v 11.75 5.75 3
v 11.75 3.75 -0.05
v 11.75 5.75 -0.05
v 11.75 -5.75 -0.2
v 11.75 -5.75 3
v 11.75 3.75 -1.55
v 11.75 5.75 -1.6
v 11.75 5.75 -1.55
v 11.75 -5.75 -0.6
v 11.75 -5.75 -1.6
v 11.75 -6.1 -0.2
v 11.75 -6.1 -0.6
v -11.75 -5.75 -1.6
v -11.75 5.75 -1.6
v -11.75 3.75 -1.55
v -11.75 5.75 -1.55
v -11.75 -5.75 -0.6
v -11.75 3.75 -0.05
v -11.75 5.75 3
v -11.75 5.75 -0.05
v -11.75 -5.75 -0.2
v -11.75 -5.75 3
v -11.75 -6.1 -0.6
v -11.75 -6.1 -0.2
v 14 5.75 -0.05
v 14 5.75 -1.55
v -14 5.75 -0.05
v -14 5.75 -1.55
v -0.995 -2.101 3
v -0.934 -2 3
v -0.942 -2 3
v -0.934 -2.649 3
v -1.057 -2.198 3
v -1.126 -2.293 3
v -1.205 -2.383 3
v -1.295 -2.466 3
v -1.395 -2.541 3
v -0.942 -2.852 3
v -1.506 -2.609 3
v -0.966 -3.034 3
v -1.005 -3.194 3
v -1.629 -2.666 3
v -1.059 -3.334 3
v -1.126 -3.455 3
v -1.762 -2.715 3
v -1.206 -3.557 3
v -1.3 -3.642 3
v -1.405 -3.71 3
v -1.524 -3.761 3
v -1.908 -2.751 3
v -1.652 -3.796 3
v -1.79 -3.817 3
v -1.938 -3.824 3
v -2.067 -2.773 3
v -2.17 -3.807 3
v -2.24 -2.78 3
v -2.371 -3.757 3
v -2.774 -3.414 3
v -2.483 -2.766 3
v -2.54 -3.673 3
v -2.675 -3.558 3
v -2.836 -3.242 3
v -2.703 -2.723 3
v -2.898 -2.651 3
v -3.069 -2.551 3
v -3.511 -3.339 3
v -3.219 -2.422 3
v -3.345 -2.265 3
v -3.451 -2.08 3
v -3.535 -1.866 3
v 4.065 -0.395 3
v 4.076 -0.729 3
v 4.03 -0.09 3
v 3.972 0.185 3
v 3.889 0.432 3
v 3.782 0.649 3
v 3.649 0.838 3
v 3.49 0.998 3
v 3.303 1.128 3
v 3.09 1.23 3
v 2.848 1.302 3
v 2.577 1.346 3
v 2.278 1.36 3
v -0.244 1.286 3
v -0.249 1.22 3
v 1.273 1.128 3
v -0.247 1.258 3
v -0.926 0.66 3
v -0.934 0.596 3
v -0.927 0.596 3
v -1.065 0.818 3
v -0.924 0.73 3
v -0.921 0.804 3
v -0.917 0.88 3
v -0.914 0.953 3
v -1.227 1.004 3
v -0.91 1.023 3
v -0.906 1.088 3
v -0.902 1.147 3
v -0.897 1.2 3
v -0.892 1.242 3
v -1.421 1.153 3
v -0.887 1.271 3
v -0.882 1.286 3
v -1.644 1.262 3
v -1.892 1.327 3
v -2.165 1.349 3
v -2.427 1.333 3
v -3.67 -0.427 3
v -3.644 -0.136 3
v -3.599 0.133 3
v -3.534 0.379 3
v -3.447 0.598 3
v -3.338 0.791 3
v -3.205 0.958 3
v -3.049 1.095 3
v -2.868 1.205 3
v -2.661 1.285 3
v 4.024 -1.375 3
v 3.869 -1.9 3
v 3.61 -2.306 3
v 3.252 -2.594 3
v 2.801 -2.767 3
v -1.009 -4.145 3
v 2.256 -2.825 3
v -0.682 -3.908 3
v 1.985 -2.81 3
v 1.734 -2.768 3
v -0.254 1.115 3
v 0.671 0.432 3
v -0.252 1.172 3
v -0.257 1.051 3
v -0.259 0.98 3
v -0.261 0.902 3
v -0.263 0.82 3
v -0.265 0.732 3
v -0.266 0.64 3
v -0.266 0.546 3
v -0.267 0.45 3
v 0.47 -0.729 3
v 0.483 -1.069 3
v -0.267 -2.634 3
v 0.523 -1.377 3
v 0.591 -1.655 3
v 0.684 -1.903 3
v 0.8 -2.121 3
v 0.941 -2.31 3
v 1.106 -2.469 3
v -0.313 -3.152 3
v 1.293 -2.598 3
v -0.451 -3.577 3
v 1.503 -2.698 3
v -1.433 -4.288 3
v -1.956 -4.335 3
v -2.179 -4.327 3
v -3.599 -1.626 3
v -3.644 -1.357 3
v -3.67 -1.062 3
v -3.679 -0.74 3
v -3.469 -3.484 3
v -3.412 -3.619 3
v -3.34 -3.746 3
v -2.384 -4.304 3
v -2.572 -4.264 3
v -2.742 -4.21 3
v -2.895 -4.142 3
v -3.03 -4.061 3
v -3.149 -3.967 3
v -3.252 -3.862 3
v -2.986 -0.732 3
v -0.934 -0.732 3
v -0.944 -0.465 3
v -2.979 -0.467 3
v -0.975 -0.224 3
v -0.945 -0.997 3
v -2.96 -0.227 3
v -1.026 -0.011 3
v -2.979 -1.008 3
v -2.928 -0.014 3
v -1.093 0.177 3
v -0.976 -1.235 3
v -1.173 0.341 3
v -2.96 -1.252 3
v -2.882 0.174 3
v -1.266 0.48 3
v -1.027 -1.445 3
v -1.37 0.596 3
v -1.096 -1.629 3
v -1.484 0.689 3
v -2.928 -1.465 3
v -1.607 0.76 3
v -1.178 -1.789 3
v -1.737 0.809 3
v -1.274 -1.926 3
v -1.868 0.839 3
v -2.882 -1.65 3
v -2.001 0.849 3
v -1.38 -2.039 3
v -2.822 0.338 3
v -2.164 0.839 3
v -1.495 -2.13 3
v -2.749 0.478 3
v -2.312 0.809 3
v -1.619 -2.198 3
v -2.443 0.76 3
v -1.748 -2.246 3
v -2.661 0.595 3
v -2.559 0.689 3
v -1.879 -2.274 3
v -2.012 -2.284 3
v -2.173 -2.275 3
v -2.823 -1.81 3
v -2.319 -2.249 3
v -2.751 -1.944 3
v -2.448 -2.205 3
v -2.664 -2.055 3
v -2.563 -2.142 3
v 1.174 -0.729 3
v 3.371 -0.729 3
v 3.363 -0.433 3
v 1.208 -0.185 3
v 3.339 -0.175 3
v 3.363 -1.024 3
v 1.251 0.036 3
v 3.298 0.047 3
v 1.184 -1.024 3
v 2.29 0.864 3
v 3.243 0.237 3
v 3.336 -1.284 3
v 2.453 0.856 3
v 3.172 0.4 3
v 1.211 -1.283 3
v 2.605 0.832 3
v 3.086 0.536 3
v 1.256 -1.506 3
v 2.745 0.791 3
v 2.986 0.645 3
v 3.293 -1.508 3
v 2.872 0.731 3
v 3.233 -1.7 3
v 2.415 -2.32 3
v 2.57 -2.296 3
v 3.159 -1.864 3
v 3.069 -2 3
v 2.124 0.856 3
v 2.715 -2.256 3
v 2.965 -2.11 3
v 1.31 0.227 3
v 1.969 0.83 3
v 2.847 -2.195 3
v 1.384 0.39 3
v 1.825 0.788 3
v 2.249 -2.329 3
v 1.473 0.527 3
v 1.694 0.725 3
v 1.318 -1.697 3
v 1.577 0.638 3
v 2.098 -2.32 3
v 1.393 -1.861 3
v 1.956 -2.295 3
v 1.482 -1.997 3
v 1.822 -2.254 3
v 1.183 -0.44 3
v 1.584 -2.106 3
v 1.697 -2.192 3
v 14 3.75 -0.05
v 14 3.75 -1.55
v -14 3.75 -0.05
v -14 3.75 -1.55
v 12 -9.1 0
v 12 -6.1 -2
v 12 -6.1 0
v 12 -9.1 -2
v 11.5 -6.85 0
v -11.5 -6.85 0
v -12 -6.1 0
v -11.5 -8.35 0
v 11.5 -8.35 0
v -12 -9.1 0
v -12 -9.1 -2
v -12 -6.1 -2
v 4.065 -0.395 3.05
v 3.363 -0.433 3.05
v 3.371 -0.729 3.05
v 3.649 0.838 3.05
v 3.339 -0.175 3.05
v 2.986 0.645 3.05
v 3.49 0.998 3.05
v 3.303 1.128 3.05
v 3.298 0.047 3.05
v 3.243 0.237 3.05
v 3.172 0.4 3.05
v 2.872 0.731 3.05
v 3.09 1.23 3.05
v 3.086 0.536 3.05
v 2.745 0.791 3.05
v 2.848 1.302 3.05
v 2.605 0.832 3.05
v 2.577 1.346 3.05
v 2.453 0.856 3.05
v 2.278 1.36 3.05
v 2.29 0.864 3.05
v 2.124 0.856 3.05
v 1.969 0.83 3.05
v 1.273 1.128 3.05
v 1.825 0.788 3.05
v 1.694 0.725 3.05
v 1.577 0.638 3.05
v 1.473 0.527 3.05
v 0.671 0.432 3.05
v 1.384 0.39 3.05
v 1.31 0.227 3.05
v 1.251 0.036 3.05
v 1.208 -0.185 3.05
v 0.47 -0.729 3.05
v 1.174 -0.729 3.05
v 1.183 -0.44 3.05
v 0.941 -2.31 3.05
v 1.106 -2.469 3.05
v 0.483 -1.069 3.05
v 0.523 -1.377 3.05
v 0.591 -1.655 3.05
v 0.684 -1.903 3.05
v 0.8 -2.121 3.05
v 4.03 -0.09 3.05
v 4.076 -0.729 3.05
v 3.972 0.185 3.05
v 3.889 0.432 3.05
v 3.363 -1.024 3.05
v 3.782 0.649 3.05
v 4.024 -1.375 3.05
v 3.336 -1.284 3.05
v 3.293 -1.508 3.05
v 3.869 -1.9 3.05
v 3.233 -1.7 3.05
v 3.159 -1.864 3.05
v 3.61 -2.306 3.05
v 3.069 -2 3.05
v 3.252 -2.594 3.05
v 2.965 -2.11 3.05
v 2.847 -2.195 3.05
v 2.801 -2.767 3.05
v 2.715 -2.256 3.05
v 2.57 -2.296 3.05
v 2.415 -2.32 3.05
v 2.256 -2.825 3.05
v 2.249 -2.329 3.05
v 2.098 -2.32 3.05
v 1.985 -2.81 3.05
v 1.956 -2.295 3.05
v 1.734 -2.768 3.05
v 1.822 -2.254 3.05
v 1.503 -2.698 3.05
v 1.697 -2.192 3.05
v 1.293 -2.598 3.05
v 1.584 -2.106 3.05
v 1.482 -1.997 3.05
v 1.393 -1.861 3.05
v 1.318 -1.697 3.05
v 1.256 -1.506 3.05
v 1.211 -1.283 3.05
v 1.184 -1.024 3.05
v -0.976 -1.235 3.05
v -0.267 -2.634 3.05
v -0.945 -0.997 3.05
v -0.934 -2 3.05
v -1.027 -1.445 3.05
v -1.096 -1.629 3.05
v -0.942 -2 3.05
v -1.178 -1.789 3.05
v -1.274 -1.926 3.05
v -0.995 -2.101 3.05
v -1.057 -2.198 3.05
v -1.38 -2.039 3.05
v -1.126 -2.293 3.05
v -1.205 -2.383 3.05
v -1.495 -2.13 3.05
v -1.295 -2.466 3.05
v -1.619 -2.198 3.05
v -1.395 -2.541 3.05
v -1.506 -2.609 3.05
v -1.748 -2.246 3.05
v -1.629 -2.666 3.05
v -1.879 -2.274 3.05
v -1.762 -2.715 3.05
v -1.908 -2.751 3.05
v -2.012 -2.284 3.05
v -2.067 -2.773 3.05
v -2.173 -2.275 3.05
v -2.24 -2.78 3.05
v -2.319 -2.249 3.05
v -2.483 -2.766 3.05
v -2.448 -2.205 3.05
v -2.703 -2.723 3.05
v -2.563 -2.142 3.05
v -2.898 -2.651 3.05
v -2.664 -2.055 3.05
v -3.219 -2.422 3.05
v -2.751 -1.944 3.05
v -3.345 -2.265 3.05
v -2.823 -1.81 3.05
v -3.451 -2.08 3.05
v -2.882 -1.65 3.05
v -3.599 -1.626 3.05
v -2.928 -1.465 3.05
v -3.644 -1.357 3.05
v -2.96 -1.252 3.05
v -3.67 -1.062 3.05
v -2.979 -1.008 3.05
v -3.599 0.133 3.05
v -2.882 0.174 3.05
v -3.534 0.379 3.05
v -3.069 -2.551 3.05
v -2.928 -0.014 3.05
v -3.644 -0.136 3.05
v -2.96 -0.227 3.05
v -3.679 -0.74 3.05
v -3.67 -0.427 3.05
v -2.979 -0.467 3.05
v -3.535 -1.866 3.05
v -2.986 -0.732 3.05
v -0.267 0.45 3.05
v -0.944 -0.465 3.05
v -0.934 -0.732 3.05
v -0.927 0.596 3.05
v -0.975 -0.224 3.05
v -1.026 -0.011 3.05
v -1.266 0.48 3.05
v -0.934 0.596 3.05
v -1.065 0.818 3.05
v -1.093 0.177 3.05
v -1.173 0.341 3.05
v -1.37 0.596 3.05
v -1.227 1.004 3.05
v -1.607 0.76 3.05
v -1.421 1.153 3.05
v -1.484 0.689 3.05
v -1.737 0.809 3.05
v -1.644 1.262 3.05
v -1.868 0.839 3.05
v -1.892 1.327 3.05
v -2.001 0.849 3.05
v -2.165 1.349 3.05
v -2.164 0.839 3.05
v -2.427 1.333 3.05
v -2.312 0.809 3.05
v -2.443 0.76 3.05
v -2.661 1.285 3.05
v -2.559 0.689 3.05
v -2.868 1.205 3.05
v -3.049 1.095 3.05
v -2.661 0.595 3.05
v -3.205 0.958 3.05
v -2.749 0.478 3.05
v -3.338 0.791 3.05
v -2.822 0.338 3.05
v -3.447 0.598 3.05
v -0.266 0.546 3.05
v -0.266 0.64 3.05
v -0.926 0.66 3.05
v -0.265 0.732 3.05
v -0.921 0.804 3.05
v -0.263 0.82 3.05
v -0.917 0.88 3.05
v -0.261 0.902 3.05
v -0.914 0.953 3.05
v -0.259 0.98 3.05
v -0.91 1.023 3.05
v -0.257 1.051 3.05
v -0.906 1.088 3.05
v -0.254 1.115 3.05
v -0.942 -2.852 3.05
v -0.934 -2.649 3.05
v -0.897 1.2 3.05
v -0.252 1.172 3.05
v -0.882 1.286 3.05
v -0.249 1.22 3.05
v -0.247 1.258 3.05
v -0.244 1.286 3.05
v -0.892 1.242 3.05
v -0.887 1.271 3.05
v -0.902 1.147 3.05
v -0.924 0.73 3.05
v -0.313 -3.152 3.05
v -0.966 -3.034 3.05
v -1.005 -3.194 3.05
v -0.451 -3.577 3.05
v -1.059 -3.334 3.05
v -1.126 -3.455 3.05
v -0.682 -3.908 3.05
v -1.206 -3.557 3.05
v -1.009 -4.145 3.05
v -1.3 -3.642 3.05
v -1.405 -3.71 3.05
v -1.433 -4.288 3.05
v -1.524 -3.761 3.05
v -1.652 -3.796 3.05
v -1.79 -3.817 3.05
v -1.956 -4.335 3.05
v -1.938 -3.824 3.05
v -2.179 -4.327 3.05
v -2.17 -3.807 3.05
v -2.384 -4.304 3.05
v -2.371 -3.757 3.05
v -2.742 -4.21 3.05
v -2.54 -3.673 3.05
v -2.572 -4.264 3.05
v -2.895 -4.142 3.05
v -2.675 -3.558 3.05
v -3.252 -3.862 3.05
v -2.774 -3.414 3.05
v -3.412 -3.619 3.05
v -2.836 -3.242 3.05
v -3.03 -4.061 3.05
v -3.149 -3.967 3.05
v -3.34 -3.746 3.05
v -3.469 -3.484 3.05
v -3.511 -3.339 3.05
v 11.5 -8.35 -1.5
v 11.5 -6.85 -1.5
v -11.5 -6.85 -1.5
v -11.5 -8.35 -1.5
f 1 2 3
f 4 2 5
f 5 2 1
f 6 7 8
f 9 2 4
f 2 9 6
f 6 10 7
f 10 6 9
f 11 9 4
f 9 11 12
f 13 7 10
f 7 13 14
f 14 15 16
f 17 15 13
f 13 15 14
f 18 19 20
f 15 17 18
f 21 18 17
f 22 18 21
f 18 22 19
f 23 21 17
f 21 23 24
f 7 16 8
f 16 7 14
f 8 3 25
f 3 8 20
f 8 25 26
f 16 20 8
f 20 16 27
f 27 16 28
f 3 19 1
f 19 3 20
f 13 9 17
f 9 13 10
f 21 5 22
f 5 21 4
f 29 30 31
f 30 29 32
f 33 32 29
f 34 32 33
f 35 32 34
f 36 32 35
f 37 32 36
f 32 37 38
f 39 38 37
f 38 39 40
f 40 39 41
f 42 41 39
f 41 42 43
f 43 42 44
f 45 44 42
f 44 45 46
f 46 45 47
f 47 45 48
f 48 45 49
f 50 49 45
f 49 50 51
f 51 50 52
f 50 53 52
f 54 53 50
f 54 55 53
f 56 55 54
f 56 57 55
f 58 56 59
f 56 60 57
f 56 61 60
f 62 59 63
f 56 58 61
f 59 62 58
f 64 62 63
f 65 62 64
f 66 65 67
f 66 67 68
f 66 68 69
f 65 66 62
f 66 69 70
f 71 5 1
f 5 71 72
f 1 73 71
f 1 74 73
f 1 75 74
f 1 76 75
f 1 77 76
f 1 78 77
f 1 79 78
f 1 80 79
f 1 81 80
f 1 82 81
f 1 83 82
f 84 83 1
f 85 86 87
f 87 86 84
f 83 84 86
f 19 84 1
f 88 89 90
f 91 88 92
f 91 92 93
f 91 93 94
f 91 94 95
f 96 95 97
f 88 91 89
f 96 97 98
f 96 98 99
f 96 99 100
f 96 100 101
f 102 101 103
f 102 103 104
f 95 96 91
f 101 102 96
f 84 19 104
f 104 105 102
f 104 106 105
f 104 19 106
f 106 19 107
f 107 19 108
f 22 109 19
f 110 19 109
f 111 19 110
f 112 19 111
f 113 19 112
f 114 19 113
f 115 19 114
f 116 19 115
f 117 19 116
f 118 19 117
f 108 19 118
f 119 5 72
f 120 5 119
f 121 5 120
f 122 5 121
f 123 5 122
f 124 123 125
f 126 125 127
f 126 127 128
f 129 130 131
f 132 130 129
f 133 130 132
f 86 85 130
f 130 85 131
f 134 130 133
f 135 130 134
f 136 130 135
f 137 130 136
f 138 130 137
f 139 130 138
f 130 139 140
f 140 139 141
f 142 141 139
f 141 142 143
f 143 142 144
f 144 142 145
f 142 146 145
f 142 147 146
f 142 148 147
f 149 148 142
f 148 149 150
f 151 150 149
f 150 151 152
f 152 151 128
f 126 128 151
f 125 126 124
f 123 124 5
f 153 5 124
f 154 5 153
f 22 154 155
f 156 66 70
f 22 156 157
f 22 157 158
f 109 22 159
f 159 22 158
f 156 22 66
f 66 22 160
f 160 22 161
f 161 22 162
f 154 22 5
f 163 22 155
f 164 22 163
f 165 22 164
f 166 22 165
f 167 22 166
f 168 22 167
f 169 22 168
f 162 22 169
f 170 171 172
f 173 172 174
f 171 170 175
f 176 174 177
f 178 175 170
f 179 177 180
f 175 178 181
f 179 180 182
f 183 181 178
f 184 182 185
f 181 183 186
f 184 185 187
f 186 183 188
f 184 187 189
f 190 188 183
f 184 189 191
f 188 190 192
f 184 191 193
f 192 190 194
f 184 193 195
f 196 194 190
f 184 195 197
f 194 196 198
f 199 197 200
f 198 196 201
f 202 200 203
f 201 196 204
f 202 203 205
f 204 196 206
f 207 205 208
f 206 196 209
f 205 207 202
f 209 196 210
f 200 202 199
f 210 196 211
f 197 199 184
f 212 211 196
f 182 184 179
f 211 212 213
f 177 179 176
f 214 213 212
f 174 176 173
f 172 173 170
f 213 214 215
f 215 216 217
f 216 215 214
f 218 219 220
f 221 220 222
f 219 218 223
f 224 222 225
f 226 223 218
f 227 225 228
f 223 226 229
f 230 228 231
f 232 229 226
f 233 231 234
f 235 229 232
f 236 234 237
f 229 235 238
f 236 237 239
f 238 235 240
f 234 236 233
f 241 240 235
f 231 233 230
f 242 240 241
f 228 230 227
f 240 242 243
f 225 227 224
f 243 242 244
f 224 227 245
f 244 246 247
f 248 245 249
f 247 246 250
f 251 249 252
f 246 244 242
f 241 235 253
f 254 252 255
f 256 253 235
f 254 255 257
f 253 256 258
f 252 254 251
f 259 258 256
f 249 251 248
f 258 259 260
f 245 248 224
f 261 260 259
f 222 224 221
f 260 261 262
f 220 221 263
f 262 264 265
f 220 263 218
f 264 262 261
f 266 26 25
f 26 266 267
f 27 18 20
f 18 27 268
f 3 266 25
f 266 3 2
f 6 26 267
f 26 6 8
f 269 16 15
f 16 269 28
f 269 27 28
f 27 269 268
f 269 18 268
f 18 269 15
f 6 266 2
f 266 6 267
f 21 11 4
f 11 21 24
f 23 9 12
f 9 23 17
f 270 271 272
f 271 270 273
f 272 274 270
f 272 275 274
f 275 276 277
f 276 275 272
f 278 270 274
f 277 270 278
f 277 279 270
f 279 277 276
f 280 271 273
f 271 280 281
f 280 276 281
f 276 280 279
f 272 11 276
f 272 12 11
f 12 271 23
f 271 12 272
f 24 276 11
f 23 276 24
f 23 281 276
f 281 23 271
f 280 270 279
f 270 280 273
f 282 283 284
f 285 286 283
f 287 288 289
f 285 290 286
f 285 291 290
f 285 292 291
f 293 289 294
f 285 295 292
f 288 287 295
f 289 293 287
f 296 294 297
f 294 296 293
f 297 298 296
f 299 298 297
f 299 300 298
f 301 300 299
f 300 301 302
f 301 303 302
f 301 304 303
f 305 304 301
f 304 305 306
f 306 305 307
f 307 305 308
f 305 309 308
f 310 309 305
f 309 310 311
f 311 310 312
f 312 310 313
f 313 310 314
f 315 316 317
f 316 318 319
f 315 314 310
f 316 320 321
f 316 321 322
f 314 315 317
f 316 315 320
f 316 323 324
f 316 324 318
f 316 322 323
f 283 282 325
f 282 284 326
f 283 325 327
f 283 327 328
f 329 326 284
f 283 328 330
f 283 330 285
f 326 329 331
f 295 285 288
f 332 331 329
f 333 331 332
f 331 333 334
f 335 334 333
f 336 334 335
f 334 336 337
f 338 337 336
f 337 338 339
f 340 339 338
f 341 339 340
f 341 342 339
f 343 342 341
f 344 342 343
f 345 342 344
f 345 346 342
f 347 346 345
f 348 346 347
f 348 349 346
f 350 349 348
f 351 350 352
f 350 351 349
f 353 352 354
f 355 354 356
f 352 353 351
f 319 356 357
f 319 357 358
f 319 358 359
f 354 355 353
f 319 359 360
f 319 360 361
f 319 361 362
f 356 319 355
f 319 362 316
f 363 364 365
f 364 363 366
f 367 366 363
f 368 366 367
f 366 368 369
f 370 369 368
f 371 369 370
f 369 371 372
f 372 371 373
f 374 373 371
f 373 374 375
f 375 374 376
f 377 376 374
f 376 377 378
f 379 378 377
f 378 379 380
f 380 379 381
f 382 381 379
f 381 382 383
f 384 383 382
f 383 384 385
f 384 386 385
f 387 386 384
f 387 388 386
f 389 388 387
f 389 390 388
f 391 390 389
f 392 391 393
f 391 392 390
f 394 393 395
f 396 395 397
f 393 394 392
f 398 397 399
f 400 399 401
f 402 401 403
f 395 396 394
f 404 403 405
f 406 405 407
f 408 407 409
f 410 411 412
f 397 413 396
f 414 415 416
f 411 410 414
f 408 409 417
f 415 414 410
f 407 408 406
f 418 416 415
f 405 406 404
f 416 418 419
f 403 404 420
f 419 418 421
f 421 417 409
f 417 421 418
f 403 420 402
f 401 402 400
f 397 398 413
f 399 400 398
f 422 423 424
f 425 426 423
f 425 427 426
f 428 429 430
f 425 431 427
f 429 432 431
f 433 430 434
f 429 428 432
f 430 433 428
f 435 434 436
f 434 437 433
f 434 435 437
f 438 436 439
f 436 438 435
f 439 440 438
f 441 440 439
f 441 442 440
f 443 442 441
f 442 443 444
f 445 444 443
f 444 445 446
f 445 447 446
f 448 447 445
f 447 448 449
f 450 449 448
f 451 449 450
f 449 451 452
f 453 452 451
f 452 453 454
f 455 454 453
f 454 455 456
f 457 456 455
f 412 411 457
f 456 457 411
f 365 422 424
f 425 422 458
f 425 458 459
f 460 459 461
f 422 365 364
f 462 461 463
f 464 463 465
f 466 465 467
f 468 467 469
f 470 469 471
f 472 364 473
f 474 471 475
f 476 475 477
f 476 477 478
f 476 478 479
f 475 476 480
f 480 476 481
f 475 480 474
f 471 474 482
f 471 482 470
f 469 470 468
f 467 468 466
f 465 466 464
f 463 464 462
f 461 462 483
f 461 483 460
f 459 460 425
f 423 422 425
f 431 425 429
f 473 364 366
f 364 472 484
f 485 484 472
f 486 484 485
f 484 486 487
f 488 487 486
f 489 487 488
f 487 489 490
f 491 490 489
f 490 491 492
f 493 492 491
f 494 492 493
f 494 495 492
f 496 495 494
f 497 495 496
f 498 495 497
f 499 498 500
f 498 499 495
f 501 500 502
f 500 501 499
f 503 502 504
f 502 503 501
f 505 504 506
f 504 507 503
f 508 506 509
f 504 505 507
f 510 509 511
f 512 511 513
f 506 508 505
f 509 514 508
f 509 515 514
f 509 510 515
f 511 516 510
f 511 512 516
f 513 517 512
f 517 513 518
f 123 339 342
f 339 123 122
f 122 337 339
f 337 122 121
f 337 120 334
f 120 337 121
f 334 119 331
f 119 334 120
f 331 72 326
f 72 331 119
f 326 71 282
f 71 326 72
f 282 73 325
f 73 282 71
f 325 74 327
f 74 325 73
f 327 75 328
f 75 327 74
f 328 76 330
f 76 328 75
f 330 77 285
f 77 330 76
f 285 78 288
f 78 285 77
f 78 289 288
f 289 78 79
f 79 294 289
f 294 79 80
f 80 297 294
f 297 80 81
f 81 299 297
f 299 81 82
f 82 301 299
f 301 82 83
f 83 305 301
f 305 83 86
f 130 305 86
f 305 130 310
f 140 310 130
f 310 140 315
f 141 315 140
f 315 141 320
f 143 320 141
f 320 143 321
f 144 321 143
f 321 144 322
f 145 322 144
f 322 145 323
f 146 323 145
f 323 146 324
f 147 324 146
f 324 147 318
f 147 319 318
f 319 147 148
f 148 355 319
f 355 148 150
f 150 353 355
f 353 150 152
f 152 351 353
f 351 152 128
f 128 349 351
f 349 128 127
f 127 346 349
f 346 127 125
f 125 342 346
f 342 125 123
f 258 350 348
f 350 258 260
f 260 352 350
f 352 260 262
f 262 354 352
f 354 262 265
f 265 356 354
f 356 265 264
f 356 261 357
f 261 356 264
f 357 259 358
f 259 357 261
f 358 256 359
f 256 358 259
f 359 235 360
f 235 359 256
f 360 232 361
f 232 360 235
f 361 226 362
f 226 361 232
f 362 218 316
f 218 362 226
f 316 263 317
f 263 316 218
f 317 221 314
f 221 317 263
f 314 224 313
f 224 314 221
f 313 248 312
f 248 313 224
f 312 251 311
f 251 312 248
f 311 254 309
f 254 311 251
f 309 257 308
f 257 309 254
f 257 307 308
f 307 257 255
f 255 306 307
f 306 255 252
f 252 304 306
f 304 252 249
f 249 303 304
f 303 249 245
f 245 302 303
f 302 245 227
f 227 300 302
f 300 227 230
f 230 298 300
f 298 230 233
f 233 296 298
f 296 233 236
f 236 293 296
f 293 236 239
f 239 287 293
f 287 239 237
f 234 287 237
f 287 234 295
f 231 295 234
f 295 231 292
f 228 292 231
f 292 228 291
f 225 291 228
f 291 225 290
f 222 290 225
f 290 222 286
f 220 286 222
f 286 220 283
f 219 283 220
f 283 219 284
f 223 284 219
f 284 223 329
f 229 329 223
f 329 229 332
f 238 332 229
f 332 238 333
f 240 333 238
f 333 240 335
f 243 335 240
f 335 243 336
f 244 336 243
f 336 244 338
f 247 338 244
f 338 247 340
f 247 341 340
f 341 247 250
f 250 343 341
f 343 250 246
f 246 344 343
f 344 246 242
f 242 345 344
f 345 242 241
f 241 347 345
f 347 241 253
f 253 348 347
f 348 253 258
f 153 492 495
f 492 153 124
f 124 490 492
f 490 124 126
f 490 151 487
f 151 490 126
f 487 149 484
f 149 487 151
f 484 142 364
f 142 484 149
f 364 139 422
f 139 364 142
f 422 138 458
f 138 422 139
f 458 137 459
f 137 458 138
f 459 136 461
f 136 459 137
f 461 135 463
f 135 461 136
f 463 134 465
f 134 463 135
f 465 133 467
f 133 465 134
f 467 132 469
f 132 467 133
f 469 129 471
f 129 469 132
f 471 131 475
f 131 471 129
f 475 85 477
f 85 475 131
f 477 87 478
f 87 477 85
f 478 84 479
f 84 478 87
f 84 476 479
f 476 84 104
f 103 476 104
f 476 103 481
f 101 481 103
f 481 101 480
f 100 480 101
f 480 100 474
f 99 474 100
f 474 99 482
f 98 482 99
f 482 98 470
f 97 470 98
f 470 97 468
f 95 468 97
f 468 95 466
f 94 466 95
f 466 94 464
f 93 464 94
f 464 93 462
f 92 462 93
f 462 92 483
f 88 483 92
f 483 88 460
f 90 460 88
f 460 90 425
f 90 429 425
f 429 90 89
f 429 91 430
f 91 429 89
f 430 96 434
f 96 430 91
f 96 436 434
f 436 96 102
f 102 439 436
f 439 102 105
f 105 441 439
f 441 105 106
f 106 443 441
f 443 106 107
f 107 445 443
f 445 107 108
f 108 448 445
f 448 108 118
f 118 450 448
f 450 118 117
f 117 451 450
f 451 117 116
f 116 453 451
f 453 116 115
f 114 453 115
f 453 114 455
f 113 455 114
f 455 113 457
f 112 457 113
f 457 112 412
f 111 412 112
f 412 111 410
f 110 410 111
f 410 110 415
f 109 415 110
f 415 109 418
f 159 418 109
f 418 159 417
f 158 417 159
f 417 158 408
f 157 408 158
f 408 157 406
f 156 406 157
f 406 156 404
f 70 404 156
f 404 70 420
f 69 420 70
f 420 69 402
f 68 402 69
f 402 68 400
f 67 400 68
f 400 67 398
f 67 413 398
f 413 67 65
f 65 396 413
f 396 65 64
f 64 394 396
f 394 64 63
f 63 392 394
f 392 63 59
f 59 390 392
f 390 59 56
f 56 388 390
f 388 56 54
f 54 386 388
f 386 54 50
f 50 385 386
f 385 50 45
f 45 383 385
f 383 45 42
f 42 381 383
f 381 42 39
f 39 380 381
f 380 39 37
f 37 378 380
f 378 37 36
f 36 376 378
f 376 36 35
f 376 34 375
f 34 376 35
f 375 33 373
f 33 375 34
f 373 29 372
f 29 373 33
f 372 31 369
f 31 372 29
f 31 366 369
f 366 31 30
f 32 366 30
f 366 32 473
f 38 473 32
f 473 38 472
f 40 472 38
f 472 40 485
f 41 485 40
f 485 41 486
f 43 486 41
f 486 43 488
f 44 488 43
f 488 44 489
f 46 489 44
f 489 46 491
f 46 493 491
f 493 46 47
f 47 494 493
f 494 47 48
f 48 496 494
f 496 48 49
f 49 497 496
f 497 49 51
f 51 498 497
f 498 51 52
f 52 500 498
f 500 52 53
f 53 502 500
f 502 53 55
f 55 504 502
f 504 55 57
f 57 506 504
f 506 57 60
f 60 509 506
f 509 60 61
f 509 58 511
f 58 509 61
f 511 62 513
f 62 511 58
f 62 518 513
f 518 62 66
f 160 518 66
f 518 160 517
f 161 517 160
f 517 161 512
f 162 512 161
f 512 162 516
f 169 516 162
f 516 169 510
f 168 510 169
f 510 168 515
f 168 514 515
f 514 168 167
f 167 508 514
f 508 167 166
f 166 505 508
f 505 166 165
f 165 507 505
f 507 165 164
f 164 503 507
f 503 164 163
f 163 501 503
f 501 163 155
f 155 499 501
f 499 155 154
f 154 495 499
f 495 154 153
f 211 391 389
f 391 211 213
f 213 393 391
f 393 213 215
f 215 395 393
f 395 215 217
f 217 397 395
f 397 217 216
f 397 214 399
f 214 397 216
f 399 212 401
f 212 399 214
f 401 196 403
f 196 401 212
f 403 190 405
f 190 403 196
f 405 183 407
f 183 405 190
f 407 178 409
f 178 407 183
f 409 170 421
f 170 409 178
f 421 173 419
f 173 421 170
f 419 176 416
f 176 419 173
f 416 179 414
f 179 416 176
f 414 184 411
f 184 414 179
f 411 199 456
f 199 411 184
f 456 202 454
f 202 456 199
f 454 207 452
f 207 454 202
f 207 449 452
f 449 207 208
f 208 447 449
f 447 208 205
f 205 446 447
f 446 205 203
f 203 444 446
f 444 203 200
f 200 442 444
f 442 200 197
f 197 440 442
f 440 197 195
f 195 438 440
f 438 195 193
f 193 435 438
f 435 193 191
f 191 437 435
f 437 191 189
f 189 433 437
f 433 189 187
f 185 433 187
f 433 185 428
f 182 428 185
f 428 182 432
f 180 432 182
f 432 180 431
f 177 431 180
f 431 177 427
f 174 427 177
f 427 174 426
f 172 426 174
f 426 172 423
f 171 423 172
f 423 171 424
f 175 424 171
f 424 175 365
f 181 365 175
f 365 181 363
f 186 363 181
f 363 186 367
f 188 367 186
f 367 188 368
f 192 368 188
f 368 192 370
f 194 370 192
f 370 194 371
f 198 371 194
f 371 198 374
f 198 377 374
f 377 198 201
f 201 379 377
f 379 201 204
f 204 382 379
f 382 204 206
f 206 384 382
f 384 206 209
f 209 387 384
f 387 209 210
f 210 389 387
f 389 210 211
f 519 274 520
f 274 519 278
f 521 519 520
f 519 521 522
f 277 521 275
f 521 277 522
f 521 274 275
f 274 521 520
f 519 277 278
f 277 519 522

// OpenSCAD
numb=1;
cap=["go"];

   for (i=[0:numb-1])
   {

difference() {

   union () {
    translate ([i*24,0,-1.5+1.4]) cube ( [23.5,11.5,3], center = true ); //buttons below panel

    translate ([i*24,0,-1.5+3]) cube ( [23.5,11.5,3], center = true ); //buttons above panel

    translate ([i*24,4.75,-0.8]) cube ( [28,2,1.5], center = true ); //stop below

    translate ([i*24,-6.5,-0.4]) cube ( [23.5,3,0.4], center = true ); //hinge

    translate ([i*24,-7.6,-1]) cube ( [24,3,2], center = true ); //mount bar

    translate([i*24-4, -2.75, 2.65]) linear_extrude(0.4) rotate([0,0,0]) text(cap[i],size=5.5);



   //translate ([0,-8.5,0.7]) cube ( [49,4,1.4], center = true ); //buttons

   //translate ([0,-6.5,-0.4]) cube ( [49,4,3], center = true ); //buttons


   };



   translate ([i*24,-7.6,-0.75]) cube ( [23,1.5,1.5], center = true ); //locating recess

   };

   
};
